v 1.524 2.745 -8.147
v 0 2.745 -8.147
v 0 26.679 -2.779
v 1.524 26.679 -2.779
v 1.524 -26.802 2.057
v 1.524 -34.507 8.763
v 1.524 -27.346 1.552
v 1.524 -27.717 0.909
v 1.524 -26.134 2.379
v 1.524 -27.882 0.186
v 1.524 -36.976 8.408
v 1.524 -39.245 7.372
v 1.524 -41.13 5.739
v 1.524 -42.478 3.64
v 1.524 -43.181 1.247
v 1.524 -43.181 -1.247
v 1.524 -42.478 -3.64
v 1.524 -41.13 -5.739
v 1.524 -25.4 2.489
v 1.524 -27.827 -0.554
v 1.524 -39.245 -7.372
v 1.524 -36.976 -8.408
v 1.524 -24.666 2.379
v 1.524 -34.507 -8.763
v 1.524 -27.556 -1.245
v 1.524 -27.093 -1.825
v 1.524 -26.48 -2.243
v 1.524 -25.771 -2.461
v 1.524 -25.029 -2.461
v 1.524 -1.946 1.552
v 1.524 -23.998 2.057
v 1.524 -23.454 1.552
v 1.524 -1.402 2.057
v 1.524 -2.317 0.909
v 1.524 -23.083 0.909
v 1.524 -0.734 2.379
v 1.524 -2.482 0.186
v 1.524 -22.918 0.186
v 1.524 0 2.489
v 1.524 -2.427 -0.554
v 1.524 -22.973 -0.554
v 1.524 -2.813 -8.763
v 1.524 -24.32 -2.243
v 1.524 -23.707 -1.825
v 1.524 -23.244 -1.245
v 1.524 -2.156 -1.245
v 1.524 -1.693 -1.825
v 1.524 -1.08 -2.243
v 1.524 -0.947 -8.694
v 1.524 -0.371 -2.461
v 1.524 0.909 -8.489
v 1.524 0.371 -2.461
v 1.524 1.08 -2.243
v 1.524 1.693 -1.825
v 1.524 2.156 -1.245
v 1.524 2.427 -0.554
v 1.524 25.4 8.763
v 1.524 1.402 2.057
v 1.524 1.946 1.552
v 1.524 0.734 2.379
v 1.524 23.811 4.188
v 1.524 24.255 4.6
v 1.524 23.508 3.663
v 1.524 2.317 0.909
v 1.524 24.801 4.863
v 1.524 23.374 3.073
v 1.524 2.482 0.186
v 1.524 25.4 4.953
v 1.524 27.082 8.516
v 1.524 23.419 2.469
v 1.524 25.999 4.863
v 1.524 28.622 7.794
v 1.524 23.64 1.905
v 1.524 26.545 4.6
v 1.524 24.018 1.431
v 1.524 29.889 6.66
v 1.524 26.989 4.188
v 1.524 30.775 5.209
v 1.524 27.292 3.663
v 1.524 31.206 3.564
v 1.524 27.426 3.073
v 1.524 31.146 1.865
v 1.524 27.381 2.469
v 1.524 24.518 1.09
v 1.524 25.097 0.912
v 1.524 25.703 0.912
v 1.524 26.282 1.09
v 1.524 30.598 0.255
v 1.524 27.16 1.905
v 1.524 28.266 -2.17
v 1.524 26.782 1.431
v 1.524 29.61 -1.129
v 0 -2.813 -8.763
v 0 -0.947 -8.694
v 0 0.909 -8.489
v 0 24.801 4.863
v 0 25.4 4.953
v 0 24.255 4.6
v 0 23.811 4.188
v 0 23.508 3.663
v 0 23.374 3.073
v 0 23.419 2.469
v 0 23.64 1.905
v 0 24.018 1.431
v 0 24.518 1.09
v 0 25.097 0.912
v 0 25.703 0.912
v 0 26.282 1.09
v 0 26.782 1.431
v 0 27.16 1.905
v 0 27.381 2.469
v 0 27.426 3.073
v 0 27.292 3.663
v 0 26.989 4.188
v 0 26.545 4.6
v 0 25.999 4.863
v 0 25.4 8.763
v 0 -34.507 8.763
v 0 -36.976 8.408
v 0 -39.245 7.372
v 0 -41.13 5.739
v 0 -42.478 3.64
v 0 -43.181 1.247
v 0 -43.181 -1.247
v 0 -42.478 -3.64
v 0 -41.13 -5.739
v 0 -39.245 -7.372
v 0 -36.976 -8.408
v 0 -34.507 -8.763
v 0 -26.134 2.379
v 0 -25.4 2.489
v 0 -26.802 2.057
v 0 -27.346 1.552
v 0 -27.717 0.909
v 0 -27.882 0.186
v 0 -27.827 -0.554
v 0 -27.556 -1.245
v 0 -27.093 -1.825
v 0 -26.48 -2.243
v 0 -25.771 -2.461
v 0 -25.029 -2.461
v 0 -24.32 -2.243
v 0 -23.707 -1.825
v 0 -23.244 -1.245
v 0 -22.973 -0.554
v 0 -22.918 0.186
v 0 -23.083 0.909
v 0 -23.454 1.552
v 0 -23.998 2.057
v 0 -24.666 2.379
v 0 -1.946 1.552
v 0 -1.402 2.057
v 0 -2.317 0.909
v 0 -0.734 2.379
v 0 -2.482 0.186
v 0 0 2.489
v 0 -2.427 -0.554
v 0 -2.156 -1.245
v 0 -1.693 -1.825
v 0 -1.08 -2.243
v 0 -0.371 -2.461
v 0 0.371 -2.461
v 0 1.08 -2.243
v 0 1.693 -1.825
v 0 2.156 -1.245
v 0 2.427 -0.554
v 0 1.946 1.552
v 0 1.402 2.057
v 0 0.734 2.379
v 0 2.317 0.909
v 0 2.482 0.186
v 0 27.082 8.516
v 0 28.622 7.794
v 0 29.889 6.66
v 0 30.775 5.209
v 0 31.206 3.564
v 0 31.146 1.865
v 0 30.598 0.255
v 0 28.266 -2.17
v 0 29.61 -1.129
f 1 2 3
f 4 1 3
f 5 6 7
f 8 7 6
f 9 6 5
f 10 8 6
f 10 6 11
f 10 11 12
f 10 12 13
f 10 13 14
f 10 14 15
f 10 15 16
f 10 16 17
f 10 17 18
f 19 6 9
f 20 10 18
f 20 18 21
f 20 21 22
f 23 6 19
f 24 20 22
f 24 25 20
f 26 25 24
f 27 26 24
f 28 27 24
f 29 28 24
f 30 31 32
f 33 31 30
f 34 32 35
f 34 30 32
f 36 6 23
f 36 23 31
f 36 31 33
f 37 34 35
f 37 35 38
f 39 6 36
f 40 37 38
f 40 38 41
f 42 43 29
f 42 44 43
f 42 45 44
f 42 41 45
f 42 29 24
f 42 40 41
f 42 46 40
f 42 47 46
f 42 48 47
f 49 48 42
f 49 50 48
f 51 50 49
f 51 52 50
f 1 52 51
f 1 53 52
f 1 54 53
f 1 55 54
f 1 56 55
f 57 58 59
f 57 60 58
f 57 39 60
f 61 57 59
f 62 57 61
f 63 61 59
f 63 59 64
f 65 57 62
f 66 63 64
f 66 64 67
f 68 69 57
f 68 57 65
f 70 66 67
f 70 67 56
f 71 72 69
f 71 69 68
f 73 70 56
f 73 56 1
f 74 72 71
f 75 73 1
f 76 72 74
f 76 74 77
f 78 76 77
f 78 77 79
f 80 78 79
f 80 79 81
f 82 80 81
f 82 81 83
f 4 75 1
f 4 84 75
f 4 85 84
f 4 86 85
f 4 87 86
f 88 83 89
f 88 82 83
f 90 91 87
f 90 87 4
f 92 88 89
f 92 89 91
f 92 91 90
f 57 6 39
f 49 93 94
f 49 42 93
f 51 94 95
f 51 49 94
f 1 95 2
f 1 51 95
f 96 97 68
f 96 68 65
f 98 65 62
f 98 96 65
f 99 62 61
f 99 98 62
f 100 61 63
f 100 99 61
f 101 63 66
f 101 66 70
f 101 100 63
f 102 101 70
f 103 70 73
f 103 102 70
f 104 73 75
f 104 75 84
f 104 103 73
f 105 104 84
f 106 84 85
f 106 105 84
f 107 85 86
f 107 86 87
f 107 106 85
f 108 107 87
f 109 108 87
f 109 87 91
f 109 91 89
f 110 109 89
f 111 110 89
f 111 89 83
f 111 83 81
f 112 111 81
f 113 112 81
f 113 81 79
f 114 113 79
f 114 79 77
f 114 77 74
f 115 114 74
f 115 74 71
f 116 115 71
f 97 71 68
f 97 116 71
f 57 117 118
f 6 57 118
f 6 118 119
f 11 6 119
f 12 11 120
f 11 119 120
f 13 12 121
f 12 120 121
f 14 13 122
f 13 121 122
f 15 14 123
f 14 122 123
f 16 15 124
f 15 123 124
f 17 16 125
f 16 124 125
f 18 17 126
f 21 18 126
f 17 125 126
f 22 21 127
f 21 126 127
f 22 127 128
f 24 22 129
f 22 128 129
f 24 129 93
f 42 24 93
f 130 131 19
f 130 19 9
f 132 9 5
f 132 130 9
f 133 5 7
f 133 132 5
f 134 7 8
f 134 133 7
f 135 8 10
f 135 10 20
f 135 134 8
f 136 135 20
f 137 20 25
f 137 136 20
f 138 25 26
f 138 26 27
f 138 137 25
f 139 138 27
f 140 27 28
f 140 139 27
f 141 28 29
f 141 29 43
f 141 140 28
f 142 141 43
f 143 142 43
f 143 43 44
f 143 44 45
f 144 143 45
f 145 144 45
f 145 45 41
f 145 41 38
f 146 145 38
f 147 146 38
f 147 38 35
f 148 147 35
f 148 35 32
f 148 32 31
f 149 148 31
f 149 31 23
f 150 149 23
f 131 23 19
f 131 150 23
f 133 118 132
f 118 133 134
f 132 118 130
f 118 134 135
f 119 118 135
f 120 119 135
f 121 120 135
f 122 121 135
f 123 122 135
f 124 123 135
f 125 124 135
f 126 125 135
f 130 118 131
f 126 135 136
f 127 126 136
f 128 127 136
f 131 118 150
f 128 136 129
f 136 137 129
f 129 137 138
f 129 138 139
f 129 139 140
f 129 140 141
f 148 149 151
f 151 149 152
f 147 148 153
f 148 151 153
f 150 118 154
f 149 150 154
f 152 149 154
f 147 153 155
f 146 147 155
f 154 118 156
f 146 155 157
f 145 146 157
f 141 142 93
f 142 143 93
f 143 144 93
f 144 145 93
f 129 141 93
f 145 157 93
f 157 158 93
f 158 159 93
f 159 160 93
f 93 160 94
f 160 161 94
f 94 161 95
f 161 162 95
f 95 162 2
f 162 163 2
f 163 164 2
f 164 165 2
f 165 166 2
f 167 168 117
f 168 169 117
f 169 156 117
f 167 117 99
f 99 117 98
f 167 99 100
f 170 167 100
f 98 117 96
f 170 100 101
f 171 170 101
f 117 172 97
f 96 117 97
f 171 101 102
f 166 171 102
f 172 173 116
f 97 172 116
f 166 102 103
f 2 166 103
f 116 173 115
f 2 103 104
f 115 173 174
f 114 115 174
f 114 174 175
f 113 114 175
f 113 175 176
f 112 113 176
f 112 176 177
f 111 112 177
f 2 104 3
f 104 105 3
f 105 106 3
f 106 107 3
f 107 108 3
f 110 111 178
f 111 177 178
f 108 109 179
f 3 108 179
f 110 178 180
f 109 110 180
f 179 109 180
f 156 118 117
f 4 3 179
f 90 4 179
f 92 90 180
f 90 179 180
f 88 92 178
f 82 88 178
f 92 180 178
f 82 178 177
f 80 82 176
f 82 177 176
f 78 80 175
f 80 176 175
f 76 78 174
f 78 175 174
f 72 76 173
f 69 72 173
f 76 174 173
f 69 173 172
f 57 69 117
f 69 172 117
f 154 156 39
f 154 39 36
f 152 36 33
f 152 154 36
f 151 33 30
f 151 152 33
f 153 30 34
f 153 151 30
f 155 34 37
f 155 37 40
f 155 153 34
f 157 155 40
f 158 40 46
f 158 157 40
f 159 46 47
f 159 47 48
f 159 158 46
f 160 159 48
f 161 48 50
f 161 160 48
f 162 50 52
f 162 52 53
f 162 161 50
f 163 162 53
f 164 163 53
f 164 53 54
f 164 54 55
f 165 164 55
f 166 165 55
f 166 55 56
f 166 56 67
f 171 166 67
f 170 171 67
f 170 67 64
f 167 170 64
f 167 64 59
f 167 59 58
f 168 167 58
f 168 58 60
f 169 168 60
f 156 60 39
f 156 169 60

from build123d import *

# Parameters (mm, degrees)
SKETCH1_R           = 2.4892
SKETCH1_R_2         = 2.032
BOSS_EXTRUDE1_DEPTH = 1.524
FILLET1_R           = 25.4


with BuildPart() as part:
    # Sketch1 → Boss-Extrude1 (new body)
    with BuildSketch(Plane(origin=(0, 0, 0), x_dir=(0, 0, -1), z_dir=(1, 0, 0))):
        with BuildLine():
            Line((8.763, -34.506990432), (8.763, 0))
            Line((8.763, 0), (2.779382525, 26.678515962))
            ThreePointArc((2.779382525, 26.678515962), (-3.564167663, 31.206487695), (-8.763, 25.4))
            Line((-8.763, 25.4), (-8.763, -34.506990432))
            ThreePointArc((-8.763, -34.506990432), (0, -43.269990432), (8.763, -34.506990432))
        make_face()
        with Locations(Location((0, 0, 0), (0, 0, 180))):
            Circle(SKETCH1_R, mode=Mode.SUBTRACT)
        with Locations(Location((0, -25.4, 0), (0, 0, 180))):
            Circle(SKETCH1_R, mode=Mode.SUBTRACT)
        with Locations(Location((-2.921, 25.4, 0), (0, 0, 180))):
            Circle(SKETCH1_R_2, mode=Mode.SUBTRACT)
    extrude(amount=BOSS_EXTRUDE1_DEPTH)

    # Fillet1
    fillet1_edges = [part.edges().sort_by_distance(p)[0] for p in [
        (0.762, 0, -8.763),
    ]]
    fillet(fillet1_edges, radius=FILLET1_R)


solid = part.part
